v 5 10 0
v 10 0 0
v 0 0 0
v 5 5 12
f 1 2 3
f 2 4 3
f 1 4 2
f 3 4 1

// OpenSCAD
// oracle: tris
polyhedron(points=[[0,0,0],[10,0,0],[5,10,0],[5,5,12]], faces=[[0,1,2],[0,3,1],[1,3,2],[2,3,0]]);
